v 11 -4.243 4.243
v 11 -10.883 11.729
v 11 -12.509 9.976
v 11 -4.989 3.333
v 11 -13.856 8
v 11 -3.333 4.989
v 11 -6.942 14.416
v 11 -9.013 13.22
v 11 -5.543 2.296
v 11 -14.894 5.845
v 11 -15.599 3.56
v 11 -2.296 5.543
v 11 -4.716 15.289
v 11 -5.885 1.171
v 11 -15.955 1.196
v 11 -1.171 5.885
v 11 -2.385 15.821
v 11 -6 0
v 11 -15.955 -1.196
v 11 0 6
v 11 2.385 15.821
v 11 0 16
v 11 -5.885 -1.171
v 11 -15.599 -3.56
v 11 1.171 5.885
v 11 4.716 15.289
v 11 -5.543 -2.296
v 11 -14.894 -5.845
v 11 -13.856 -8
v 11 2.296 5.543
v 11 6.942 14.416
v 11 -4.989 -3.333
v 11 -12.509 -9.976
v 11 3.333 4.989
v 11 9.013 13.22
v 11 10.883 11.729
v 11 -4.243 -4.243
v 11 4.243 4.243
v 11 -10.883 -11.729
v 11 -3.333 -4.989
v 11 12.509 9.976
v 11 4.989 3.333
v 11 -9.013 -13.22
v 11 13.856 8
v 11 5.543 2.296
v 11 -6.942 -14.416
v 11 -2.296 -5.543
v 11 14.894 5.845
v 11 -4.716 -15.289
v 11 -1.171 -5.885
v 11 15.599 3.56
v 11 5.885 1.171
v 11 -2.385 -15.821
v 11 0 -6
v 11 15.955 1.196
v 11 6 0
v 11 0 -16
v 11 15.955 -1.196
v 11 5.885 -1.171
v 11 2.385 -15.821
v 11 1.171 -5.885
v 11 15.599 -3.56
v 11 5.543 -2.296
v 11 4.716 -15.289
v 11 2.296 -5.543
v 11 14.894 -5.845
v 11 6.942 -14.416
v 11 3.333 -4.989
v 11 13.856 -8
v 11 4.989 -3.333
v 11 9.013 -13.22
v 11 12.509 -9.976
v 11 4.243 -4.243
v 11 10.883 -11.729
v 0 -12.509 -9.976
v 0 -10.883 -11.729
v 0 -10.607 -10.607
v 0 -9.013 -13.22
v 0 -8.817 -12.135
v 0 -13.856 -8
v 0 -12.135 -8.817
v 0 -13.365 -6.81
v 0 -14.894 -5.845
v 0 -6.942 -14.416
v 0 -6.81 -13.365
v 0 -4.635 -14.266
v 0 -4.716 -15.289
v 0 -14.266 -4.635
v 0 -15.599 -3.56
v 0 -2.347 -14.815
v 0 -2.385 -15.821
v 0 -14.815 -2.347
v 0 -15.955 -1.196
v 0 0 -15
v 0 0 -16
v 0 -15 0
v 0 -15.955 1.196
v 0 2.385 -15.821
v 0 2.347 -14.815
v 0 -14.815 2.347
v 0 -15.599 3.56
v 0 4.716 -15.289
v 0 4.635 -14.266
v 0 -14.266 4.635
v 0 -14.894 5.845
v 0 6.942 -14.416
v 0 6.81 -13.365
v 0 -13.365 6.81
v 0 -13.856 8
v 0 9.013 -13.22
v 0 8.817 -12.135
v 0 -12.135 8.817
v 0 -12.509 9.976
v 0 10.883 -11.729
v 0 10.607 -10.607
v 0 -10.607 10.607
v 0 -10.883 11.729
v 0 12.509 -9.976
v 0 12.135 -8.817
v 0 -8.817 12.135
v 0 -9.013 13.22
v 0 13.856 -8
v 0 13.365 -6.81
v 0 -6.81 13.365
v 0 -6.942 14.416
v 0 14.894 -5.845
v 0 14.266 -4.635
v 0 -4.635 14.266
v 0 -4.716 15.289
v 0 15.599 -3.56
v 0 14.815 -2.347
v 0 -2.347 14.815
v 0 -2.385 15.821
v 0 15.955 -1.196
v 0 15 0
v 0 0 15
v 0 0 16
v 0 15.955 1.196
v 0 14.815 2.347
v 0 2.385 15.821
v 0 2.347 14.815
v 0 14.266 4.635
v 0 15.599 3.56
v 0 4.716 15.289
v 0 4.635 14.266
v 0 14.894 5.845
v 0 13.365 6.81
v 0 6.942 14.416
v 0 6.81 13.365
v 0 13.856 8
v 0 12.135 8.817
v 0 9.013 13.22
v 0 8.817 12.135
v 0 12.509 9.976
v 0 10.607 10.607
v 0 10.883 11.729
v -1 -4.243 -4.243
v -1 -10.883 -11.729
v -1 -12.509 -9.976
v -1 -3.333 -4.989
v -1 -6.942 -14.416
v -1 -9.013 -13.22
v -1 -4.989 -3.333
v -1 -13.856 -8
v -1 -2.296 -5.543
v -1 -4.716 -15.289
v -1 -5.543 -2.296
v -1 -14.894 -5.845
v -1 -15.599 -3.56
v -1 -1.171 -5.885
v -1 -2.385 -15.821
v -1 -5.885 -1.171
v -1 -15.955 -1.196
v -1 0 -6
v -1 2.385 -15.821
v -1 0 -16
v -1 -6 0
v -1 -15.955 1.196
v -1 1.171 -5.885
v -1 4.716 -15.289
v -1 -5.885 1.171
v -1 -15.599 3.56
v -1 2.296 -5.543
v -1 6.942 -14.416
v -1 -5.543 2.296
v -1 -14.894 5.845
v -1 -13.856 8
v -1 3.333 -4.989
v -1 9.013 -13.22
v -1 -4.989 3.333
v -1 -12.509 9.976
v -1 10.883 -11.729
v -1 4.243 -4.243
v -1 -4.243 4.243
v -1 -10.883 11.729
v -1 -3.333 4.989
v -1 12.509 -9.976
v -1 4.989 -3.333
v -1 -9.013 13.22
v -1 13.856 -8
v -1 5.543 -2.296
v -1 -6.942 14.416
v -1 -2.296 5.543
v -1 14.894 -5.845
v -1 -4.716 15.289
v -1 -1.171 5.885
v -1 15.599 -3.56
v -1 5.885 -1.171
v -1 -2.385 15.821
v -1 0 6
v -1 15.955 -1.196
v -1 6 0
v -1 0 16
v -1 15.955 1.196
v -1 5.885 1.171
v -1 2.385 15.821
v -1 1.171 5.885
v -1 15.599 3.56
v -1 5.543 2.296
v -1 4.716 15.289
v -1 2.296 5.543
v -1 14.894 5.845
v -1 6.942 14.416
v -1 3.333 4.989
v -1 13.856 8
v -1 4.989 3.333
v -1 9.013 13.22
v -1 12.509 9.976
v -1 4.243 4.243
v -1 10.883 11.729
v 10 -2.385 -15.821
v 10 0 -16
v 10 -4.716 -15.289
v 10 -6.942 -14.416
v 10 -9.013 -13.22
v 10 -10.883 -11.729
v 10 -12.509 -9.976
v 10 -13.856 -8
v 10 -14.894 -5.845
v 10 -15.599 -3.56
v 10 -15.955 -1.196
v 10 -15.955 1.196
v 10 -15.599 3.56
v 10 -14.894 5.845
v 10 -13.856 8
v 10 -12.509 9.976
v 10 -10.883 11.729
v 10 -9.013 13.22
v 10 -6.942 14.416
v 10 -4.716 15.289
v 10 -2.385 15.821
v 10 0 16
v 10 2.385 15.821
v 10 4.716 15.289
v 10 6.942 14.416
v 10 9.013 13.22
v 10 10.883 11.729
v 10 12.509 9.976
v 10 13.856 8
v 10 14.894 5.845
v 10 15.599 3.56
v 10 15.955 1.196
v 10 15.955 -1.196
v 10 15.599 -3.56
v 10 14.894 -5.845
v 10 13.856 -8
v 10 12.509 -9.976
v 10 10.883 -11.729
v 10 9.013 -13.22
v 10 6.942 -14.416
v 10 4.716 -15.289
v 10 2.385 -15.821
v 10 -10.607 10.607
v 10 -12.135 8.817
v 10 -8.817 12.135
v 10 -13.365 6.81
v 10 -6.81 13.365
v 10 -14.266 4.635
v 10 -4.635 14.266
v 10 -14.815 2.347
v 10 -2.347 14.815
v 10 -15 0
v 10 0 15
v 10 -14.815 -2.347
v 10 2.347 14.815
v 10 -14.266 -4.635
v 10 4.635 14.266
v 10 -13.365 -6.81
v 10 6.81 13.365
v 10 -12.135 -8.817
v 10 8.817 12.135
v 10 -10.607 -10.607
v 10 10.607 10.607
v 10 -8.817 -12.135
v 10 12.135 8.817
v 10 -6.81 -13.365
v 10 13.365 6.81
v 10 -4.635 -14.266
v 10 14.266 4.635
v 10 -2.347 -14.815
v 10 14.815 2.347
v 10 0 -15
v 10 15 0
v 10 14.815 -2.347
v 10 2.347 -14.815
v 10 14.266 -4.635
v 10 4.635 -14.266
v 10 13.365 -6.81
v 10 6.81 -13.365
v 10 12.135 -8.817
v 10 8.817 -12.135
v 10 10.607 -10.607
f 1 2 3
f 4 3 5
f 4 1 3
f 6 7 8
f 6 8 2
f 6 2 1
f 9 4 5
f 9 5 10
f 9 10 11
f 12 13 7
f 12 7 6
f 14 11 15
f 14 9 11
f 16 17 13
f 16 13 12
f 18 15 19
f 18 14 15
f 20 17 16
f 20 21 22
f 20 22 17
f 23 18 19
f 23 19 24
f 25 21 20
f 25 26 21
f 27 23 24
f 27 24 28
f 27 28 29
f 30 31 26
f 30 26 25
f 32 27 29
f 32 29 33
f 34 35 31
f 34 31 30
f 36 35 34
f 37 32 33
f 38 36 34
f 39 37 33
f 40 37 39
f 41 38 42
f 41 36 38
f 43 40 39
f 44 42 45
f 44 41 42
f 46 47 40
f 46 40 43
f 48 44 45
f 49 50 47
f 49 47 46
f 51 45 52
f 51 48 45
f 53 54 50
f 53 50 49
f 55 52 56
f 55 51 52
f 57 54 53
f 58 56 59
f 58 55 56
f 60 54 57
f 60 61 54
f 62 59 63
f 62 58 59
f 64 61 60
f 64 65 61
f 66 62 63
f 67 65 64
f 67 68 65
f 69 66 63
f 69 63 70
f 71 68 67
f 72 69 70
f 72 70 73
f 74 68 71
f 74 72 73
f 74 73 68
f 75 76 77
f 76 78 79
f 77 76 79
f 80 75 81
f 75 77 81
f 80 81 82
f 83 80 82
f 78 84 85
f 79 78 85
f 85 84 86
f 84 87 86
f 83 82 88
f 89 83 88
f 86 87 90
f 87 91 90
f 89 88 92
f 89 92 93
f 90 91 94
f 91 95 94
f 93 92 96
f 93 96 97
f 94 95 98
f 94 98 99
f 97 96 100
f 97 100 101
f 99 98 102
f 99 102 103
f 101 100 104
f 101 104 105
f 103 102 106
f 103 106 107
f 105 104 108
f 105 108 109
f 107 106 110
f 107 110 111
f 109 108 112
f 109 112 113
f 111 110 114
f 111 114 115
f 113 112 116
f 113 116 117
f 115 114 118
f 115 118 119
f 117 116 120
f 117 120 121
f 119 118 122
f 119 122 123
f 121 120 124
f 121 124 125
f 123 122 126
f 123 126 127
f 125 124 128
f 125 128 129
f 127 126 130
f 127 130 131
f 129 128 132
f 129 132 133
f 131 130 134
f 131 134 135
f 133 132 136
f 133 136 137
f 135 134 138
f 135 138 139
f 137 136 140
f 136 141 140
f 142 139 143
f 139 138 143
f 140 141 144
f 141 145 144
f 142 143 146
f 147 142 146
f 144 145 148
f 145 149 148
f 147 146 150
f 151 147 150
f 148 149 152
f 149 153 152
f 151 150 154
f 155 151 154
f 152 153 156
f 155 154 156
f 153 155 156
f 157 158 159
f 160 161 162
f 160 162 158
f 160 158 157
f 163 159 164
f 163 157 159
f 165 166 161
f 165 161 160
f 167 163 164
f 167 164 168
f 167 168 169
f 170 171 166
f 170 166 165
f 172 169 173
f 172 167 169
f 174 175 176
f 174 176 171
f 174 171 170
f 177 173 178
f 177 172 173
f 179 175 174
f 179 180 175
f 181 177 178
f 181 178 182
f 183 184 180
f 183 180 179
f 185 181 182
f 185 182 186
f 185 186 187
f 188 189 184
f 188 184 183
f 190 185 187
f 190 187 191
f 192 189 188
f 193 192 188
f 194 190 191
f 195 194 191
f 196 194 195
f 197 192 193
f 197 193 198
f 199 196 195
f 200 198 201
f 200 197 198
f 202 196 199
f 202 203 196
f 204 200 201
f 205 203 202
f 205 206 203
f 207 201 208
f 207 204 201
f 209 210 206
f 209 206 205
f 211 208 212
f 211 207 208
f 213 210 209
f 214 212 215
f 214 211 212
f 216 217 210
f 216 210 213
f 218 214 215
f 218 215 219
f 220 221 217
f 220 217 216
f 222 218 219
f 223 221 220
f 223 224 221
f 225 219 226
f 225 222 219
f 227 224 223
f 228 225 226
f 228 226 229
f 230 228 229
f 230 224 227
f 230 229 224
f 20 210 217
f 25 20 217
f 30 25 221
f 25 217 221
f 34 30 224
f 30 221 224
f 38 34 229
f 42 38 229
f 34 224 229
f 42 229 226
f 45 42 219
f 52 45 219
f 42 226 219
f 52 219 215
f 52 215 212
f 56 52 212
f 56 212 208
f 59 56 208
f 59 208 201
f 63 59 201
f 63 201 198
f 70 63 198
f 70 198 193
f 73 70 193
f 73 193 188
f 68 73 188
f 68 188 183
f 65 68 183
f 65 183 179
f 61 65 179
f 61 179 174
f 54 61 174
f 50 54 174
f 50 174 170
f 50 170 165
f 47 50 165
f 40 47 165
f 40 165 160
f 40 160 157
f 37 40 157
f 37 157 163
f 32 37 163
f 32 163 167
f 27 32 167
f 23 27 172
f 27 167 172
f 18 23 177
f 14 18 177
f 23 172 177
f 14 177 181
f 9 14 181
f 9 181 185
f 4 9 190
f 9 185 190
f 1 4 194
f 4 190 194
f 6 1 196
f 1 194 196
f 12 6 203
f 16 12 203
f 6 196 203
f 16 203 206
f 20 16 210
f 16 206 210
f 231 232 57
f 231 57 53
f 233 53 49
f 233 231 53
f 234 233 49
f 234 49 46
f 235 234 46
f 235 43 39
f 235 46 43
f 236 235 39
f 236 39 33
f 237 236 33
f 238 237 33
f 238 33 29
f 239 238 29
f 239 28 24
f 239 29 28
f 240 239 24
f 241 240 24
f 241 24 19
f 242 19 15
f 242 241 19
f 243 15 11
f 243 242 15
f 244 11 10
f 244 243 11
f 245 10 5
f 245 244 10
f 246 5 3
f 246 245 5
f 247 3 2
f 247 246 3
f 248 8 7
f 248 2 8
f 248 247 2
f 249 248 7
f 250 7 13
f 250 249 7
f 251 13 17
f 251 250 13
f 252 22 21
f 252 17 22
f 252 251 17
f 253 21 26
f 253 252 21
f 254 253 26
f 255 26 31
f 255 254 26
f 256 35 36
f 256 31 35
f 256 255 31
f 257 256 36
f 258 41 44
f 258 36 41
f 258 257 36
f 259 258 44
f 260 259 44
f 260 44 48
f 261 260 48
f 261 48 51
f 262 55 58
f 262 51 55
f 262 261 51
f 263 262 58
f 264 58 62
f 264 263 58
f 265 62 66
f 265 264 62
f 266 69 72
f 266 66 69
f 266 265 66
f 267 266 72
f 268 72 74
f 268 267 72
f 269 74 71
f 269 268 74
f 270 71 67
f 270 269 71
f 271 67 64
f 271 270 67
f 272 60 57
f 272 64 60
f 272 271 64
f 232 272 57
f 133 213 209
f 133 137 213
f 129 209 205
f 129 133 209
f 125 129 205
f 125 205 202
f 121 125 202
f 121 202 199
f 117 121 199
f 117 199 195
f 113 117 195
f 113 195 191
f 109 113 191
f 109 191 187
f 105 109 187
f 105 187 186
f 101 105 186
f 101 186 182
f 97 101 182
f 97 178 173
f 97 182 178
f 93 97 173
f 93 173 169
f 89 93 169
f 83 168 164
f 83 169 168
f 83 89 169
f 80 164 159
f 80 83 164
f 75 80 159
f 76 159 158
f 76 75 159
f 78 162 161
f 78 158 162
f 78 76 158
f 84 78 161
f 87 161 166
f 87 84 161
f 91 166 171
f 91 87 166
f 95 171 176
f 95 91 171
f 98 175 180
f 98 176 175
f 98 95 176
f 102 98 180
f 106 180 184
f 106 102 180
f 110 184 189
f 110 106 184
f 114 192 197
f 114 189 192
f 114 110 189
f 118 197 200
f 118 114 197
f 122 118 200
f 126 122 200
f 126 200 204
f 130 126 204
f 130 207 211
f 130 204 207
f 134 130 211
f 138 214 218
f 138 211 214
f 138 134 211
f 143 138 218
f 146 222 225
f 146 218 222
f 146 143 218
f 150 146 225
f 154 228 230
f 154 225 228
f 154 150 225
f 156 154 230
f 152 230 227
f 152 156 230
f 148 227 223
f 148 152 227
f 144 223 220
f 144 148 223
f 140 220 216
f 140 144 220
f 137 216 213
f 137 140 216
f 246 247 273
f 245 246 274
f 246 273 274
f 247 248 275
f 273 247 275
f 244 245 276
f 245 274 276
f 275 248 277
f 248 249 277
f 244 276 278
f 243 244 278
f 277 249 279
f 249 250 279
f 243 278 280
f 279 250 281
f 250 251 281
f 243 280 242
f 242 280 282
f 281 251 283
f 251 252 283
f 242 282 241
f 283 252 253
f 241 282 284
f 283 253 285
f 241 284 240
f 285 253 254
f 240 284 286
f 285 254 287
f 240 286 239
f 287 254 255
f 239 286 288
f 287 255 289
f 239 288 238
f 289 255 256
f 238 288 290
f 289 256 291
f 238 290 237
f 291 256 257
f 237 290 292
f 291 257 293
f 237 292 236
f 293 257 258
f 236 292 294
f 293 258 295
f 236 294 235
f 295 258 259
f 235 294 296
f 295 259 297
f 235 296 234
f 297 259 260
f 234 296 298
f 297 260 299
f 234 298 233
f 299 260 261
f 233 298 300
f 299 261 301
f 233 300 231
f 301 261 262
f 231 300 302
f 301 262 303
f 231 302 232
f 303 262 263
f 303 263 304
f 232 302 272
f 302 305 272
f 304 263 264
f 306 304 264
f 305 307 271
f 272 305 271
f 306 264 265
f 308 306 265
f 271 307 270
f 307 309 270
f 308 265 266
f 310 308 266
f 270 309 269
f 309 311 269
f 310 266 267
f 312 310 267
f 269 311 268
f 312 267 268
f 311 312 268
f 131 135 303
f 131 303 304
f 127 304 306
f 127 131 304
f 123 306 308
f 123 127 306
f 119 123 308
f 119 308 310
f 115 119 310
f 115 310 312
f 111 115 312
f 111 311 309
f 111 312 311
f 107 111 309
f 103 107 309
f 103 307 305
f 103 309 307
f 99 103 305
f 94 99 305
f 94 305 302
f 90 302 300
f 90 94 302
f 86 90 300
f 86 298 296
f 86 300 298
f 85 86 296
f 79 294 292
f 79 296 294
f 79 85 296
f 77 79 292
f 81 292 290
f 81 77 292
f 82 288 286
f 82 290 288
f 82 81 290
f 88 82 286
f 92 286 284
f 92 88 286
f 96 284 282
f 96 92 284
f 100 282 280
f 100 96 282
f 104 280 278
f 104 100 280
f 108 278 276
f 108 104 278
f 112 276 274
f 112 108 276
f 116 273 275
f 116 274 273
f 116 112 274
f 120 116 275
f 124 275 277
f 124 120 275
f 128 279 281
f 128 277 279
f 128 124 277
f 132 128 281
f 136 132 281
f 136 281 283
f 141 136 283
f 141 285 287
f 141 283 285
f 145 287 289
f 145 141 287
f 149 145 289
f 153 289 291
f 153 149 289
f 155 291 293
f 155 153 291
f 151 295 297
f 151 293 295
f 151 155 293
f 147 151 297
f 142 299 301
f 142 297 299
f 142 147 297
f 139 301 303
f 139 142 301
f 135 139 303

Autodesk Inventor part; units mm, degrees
ref_plane "YZ Plane" through (0, 0, 0) normal (1, 0, 0) x (0, 1, 0)
ref_plane "XZ Plane" through (0, 0, 0) normal (0, 1, 0) x (-1, 0, 0)
ref_plane "XY Plane" through (0, 0, 0) normal (0, 0, 1) x (1, 0, 0)
sketch "スケッチ1" plane through (0, 0, 0) normal (1, 0, 0) x (0, 1, 0)
  circle A0 centre (0, 0) radius 15
  dimension "d0" = 30
extrude "押し出し1" add sketch "スケッチ1" along normal blind 10
sketch "スケッチ2" plane through (10, 0, 0) normal (1, 0, 0) x (0, 0, -1)
  circle A0 centre (0, 0) radius 16
  dimension "d3" = 32
extrude "押し出し2" add sketch "スケッチ2" along normal blind 1
sketch "スケッチ3" plane through (0, 0, 0) normal (-1, 0, 0) x (0, 0, 1)
  circle A0 centre (0, 0) radius 16
  dimension "d6" = 32
extrude "押し出し3" add sketch "スケッチ3" along normal blind 1
sketch "スケッチ4" plane through (-1, 0, 0) normal (-1, 0, 0) x (0, 0, 1)
  circle A0 centre (0, 0) radius 6
  dimension "d9" = 12
extrude "押し出し4" cut sketch "スケッチ4" against normal blind 12
properties part number "type2" material "アセタール樹脂、白"
